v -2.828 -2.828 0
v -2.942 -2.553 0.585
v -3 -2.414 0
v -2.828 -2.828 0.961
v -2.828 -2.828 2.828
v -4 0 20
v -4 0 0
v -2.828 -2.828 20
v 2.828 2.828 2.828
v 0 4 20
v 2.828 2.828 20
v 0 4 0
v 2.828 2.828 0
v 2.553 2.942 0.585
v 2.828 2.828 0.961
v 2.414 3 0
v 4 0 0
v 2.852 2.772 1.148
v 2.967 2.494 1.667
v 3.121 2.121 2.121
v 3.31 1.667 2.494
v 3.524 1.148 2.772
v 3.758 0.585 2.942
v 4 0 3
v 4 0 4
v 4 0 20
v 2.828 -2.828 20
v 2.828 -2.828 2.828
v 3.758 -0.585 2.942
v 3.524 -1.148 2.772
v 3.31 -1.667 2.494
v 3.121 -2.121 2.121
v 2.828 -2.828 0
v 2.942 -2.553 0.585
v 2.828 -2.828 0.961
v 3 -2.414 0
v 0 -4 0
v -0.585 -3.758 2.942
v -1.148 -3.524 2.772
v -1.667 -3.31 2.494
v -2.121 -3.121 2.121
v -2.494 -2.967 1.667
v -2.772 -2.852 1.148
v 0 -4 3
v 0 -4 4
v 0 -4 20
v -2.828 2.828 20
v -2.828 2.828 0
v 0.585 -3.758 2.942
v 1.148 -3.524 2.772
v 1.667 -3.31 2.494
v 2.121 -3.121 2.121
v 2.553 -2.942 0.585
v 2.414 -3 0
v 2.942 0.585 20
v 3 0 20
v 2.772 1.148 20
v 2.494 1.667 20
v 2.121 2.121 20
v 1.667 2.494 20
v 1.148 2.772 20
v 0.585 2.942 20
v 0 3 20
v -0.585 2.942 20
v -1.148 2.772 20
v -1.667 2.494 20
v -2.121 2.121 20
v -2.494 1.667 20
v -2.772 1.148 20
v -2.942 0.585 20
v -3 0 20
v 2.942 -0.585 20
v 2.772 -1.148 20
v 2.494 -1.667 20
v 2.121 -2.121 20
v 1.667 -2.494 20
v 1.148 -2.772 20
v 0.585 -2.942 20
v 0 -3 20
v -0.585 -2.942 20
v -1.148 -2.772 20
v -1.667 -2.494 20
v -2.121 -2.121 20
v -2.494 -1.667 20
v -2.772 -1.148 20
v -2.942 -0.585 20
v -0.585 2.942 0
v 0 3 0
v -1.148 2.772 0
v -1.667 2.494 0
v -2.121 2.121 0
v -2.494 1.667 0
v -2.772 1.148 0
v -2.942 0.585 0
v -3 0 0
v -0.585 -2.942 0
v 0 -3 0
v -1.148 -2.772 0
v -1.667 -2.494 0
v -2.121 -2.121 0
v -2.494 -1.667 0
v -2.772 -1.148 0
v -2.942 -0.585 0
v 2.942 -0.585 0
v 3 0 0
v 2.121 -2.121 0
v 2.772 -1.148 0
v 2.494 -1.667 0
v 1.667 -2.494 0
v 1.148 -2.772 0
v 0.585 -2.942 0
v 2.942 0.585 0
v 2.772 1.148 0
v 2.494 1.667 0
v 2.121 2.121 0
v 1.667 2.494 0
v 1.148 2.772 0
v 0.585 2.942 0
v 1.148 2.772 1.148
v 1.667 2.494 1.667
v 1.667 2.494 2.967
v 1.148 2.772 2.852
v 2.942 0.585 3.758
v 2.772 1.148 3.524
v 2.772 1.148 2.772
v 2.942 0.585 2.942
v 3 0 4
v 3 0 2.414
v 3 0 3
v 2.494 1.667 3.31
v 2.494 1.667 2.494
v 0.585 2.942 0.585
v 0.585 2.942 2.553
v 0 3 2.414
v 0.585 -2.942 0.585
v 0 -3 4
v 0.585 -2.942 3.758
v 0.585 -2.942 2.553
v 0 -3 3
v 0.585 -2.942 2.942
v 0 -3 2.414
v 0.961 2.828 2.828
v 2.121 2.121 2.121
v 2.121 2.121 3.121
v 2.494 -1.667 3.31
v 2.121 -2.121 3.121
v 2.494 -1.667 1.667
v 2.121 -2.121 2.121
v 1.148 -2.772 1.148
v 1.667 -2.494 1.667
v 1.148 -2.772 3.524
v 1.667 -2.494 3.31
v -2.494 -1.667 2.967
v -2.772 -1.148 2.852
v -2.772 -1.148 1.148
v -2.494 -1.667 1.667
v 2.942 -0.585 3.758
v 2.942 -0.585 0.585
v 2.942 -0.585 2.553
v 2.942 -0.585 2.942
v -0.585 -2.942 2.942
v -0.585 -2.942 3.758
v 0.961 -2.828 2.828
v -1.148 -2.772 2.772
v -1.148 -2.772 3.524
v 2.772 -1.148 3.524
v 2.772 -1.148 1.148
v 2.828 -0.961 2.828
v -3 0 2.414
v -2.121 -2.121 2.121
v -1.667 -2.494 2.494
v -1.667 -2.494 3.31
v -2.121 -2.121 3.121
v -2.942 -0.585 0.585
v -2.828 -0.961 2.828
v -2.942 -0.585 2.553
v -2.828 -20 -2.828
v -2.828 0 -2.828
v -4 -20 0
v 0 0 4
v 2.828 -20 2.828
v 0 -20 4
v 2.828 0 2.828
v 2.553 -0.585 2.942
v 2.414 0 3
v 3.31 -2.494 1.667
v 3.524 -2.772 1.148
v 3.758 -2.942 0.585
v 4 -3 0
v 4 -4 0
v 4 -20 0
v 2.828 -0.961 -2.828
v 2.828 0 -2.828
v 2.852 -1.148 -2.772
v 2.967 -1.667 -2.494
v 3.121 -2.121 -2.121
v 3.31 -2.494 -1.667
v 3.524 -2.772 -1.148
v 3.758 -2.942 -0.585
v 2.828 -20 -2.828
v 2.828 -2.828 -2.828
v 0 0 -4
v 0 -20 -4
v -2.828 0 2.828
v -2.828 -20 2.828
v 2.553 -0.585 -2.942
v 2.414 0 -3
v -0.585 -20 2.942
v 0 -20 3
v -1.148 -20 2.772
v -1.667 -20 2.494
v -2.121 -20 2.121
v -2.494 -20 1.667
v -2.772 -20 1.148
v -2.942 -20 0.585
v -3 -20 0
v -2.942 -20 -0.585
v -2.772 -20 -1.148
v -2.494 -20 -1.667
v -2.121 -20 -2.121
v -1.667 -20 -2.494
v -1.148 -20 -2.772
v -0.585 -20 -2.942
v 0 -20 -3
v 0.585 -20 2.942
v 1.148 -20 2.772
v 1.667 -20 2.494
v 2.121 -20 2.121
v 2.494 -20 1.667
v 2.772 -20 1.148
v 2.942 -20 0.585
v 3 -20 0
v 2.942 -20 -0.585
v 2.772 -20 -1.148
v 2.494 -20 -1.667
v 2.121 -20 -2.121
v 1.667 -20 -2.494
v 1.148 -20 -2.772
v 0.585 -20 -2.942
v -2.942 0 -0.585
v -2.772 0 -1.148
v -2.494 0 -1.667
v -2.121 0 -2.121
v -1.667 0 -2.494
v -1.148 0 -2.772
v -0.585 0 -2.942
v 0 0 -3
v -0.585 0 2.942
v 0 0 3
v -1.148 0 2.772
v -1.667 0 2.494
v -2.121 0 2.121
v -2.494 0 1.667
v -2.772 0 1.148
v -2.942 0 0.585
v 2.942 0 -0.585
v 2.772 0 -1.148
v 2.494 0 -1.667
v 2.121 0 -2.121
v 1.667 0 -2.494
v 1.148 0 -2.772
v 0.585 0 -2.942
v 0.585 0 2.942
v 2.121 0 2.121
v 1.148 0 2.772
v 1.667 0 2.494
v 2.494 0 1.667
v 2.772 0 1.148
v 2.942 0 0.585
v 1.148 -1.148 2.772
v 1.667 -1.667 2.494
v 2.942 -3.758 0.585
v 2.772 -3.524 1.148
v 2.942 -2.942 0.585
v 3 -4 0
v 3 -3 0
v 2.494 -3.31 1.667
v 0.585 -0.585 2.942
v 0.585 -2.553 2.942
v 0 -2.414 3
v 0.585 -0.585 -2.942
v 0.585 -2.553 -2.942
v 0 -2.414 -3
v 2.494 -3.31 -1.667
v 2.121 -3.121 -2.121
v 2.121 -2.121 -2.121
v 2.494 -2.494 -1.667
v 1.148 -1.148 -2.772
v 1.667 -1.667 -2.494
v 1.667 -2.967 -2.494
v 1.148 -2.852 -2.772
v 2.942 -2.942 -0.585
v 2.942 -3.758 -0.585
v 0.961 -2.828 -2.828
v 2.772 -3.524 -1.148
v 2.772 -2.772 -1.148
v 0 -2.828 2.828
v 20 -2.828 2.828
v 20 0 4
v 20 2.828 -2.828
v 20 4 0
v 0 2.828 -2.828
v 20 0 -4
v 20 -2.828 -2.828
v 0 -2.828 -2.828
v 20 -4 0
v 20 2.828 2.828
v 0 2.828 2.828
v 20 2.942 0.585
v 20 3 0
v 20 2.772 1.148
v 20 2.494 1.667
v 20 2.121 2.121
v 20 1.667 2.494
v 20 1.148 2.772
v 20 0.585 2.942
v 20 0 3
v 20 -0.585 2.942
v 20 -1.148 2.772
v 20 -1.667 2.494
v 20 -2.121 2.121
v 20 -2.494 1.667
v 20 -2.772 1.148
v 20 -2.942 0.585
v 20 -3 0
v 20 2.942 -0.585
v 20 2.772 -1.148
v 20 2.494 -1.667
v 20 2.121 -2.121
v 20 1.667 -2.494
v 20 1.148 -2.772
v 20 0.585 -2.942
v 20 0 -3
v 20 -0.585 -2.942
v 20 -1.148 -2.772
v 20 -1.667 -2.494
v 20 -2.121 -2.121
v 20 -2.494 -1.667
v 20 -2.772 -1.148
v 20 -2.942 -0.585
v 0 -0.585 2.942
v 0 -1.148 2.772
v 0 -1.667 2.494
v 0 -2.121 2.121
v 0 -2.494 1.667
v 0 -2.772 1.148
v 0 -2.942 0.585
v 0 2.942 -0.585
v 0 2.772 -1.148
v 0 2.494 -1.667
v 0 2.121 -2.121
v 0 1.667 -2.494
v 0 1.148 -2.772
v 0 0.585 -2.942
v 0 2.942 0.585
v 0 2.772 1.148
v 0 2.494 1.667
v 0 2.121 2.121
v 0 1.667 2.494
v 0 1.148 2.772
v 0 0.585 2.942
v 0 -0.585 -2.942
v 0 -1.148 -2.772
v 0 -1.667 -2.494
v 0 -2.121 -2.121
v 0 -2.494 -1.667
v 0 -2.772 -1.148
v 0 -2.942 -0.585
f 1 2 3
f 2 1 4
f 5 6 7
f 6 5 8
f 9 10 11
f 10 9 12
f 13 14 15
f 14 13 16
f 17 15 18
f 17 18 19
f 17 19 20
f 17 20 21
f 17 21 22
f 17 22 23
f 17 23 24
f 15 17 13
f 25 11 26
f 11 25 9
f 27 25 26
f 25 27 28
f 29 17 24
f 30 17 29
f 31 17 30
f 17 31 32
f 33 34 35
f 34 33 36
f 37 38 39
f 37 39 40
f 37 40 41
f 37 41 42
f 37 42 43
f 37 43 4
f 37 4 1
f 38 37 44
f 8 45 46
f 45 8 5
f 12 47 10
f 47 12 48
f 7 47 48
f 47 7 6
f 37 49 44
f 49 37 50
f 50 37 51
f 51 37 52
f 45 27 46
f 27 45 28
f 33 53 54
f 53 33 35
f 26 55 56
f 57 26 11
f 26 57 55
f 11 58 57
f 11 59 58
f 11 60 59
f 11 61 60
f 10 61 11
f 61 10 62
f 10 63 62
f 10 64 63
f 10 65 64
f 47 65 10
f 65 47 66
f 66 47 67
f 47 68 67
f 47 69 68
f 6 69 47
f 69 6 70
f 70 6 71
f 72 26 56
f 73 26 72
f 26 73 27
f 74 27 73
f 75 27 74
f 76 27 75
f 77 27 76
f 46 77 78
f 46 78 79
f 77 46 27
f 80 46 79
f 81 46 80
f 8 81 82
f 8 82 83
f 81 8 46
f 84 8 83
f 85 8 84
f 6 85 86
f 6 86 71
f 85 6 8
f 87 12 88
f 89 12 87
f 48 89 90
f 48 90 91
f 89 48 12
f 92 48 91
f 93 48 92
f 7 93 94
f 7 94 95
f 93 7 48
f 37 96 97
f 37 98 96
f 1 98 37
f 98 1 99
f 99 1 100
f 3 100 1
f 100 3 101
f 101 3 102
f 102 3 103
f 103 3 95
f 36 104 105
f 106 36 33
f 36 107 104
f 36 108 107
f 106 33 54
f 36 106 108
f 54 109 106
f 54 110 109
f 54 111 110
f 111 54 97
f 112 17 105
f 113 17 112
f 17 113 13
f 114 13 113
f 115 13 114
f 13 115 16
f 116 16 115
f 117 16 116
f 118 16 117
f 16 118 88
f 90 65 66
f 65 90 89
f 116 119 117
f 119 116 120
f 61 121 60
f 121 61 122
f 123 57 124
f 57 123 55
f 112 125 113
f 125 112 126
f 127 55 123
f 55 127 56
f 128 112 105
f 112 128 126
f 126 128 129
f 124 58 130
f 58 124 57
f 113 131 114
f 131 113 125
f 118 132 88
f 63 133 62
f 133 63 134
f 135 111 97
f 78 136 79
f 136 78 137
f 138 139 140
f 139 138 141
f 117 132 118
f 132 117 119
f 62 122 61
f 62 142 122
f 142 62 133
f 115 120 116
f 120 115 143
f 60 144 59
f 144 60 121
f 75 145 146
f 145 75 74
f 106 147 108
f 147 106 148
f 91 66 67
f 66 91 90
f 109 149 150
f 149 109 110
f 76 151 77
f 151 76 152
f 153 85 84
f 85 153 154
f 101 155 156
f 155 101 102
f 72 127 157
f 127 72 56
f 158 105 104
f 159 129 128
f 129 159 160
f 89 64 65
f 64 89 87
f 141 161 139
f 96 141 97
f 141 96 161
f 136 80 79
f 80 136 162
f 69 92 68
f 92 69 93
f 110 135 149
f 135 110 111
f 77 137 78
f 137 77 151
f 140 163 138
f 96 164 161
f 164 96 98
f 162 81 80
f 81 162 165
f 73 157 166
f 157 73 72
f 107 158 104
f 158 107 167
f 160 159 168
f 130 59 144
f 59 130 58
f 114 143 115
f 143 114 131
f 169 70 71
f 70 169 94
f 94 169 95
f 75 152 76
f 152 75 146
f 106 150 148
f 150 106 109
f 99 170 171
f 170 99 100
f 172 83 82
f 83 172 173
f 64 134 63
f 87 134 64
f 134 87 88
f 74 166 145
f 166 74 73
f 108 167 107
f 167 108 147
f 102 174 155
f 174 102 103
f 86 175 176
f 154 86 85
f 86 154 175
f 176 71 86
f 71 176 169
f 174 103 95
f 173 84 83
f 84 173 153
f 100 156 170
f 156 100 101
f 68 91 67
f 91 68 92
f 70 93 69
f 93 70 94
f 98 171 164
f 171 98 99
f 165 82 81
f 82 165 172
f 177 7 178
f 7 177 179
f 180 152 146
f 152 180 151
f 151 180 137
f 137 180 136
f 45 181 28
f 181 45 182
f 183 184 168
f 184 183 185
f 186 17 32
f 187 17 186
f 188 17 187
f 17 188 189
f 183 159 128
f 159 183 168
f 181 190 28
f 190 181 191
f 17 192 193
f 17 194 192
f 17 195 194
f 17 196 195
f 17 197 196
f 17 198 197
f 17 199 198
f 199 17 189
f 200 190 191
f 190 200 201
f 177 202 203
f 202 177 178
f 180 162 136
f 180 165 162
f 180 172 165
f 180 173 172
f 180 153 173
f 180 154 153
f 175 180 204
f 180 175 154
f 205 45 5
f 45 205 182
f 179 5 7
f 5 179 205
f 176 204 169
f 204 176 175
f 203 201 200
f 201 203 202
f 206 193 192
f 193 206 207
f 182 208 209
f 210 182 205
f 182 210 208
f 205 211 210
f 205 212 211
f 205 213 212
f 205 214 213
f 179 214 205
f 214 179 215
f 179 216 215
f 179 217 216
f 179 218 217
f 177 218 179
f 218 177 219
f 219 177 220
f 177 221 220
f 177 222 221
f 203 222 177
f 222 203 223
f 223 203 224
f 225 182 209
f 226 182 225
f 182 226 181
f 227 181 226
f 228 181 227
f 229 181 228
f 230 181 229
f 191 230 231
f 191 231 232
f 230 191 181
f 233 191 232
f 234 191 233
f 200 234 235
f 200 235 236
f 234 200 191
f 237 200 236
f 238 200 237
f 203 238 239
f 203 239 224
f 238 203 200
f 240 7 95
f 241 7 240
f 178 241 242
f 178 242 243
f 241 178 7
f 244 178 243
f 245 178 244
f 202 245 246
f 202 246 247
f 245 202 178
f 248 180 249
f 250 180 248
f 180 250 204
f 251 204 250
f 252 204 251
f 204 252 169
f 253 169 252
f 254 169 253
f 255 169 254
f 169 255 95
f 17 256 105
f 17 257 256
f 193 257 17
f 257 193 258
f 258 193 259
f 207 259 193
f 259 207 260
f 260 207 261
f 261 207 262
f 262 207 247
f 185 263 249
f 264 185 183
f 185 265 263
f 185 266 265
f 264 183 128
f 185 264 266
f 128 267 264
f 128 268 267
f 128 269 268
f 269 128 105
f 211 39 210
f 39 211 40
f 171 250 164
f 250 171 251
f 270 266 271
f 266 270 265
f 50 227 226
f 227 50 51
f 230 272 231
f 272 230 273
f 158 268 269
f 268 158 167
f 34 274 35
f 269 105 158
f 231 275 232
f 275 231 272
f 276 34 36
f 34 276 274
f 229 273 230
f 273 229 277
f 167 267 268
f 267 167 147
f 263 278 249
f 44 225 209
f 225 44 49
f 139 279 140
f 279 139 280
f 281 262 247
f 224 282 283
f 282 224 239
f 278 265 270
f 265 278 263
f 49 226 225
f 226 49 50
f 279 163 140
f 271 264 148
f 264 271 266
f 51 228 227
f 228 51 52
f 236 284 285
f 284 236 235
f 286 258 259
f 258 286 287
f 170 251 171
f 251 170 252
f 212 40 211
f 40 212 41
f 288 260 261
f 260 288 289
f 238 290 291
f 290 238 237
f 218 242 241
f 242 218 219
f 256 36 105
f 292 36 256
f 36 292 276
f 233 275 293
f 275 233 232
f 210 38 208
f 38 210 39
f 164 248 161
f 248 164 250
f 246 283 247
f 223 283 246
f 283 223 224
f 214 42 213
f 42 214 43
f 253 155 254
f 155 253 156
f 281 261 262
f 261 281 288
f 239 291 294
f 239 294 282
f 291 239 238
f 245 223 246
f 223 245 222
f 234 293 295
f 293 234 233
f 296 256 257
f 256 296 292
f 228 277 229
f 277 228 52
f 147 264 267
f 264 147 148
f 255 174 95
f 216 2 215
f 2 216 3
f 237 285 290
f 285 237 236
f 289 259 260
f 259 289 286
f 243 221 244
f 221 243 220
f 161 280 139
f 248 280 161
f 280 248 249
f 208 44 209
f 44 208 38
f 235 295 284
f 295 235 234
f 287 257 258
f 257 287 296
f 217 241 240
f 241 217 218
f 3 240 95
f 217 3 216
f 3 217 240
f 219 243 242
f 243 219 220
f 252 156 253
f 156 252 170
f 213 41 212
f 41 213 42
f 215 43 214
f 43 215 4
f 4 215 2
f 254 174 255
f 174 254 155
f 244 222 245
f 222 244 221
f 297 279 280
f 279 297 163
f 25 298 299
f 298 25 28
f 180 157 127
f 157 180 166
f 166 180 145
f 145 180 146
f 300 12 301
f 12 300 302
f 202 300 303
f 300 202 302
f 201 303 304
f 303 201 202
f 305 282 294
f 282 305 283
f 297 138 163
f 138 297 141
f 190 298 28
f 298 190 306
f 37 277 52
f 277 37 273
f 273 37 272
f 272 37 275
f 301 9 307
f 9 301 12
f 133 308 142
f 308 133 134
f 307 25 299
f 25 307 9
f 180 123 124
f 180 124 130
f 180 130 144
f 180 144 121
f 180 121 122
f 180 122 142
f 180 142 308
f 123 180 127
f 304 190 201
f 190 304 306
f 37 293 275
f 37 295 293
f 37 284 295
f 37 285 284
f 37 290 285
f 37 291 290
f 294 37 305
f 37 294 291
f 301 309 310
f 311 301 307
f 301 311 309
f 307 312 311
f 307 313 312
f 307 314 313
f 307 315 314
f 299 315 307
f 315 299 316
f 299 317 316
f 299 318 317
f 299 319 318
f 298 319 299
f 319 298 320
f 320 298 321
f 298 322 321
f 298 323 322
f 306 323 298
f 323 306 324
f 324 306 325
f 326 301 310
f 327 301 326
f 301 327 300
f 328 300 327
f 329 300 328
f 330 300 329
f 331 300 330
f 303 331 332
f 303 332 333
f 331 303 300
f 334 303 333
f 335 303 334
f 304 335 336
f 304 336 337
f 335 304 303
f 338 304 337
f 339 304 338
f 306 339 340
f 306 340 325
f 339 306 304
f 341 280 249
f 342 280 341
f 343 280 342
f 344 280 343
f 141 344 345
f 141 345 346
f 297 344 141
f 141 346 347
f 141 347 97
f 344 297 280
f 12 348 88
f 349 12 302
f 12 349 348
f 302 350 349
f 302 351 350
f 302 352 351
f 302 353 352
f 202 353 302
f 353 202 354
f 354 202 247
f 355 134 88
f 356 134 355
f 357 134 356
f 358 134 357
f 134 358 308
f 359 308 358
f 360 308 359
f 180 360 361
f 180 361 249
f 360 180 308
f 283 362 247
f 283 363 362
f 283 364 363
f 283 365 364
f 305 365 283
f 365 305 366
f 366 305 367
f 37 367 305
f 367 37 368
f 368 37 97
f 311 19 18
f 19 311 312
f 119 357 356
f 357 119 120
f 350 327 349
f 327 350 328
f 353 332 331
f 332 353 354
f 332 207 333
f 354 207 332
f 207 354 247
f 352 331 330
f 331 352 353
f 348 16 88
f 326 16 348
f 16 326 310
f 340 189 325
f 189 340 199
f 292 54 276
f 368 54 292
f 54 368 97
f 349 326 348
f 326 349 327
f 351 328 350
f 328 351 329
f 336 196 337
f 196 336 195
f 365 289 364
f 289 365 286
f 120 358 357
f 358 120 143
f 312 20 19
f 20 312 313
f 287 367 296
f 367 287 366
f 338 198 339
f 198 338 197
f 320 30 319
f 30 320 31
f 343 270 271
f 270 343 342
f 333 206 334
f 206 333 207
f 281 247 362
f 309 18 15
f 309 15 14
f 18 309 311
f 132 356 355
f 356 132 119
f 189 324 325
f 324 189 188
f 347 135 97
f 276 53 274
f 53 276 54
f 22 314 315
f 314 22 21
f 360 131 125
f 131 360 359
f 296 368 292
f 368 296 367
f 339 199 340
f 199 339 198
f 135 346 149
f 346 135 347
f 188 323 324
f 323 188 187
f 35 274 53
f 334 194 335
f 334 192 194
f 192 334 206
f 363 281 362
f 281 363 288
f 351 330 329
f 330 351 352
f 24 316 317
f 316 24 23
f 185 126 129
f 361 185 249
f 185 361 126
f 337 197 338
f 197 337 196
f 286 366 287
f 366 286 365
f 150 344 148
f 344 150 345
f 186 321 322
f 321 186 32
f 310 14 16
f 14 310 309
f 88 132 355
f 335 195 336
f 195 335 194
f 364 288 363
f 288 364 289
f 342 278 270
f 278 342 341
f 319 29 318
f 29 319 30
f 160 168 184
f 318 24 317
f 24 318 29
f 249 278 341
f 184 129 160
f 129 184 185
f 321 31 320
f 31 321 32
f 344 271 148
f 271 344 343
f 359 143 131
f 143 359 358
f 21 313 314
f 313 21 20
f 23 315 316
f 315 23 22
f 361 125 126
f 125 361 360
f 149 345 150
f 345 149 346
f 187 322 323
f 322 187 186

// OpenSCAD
module hollow_cylinder(dInner, dOuter, height, fnOuter, fnInner) {
    //Please provide the 
    //inner diameter and the 
    //outer diameter
    //as input parameters for this function

    difference() {
        cylinder(h=height, d=dOuter, $fn=fnOuter);
        cylinder(h=height, d=dInner, $fn=fnInner);
    }
}
rotations = [[0,0,0],[90,0,0],[0,90,0]];

height_ = 20;

for(i = [0:2]) {

    rotate(rotations[i]) hollow_cylinder(dInner = 6, dOuter = 8, height = height_, fnInner = 32, fnOuter = 8);
}

//hollow_cylinder(dInner = 6, dOuter = 8, height = height_, fnInner = 32, fnOuter = 8);
